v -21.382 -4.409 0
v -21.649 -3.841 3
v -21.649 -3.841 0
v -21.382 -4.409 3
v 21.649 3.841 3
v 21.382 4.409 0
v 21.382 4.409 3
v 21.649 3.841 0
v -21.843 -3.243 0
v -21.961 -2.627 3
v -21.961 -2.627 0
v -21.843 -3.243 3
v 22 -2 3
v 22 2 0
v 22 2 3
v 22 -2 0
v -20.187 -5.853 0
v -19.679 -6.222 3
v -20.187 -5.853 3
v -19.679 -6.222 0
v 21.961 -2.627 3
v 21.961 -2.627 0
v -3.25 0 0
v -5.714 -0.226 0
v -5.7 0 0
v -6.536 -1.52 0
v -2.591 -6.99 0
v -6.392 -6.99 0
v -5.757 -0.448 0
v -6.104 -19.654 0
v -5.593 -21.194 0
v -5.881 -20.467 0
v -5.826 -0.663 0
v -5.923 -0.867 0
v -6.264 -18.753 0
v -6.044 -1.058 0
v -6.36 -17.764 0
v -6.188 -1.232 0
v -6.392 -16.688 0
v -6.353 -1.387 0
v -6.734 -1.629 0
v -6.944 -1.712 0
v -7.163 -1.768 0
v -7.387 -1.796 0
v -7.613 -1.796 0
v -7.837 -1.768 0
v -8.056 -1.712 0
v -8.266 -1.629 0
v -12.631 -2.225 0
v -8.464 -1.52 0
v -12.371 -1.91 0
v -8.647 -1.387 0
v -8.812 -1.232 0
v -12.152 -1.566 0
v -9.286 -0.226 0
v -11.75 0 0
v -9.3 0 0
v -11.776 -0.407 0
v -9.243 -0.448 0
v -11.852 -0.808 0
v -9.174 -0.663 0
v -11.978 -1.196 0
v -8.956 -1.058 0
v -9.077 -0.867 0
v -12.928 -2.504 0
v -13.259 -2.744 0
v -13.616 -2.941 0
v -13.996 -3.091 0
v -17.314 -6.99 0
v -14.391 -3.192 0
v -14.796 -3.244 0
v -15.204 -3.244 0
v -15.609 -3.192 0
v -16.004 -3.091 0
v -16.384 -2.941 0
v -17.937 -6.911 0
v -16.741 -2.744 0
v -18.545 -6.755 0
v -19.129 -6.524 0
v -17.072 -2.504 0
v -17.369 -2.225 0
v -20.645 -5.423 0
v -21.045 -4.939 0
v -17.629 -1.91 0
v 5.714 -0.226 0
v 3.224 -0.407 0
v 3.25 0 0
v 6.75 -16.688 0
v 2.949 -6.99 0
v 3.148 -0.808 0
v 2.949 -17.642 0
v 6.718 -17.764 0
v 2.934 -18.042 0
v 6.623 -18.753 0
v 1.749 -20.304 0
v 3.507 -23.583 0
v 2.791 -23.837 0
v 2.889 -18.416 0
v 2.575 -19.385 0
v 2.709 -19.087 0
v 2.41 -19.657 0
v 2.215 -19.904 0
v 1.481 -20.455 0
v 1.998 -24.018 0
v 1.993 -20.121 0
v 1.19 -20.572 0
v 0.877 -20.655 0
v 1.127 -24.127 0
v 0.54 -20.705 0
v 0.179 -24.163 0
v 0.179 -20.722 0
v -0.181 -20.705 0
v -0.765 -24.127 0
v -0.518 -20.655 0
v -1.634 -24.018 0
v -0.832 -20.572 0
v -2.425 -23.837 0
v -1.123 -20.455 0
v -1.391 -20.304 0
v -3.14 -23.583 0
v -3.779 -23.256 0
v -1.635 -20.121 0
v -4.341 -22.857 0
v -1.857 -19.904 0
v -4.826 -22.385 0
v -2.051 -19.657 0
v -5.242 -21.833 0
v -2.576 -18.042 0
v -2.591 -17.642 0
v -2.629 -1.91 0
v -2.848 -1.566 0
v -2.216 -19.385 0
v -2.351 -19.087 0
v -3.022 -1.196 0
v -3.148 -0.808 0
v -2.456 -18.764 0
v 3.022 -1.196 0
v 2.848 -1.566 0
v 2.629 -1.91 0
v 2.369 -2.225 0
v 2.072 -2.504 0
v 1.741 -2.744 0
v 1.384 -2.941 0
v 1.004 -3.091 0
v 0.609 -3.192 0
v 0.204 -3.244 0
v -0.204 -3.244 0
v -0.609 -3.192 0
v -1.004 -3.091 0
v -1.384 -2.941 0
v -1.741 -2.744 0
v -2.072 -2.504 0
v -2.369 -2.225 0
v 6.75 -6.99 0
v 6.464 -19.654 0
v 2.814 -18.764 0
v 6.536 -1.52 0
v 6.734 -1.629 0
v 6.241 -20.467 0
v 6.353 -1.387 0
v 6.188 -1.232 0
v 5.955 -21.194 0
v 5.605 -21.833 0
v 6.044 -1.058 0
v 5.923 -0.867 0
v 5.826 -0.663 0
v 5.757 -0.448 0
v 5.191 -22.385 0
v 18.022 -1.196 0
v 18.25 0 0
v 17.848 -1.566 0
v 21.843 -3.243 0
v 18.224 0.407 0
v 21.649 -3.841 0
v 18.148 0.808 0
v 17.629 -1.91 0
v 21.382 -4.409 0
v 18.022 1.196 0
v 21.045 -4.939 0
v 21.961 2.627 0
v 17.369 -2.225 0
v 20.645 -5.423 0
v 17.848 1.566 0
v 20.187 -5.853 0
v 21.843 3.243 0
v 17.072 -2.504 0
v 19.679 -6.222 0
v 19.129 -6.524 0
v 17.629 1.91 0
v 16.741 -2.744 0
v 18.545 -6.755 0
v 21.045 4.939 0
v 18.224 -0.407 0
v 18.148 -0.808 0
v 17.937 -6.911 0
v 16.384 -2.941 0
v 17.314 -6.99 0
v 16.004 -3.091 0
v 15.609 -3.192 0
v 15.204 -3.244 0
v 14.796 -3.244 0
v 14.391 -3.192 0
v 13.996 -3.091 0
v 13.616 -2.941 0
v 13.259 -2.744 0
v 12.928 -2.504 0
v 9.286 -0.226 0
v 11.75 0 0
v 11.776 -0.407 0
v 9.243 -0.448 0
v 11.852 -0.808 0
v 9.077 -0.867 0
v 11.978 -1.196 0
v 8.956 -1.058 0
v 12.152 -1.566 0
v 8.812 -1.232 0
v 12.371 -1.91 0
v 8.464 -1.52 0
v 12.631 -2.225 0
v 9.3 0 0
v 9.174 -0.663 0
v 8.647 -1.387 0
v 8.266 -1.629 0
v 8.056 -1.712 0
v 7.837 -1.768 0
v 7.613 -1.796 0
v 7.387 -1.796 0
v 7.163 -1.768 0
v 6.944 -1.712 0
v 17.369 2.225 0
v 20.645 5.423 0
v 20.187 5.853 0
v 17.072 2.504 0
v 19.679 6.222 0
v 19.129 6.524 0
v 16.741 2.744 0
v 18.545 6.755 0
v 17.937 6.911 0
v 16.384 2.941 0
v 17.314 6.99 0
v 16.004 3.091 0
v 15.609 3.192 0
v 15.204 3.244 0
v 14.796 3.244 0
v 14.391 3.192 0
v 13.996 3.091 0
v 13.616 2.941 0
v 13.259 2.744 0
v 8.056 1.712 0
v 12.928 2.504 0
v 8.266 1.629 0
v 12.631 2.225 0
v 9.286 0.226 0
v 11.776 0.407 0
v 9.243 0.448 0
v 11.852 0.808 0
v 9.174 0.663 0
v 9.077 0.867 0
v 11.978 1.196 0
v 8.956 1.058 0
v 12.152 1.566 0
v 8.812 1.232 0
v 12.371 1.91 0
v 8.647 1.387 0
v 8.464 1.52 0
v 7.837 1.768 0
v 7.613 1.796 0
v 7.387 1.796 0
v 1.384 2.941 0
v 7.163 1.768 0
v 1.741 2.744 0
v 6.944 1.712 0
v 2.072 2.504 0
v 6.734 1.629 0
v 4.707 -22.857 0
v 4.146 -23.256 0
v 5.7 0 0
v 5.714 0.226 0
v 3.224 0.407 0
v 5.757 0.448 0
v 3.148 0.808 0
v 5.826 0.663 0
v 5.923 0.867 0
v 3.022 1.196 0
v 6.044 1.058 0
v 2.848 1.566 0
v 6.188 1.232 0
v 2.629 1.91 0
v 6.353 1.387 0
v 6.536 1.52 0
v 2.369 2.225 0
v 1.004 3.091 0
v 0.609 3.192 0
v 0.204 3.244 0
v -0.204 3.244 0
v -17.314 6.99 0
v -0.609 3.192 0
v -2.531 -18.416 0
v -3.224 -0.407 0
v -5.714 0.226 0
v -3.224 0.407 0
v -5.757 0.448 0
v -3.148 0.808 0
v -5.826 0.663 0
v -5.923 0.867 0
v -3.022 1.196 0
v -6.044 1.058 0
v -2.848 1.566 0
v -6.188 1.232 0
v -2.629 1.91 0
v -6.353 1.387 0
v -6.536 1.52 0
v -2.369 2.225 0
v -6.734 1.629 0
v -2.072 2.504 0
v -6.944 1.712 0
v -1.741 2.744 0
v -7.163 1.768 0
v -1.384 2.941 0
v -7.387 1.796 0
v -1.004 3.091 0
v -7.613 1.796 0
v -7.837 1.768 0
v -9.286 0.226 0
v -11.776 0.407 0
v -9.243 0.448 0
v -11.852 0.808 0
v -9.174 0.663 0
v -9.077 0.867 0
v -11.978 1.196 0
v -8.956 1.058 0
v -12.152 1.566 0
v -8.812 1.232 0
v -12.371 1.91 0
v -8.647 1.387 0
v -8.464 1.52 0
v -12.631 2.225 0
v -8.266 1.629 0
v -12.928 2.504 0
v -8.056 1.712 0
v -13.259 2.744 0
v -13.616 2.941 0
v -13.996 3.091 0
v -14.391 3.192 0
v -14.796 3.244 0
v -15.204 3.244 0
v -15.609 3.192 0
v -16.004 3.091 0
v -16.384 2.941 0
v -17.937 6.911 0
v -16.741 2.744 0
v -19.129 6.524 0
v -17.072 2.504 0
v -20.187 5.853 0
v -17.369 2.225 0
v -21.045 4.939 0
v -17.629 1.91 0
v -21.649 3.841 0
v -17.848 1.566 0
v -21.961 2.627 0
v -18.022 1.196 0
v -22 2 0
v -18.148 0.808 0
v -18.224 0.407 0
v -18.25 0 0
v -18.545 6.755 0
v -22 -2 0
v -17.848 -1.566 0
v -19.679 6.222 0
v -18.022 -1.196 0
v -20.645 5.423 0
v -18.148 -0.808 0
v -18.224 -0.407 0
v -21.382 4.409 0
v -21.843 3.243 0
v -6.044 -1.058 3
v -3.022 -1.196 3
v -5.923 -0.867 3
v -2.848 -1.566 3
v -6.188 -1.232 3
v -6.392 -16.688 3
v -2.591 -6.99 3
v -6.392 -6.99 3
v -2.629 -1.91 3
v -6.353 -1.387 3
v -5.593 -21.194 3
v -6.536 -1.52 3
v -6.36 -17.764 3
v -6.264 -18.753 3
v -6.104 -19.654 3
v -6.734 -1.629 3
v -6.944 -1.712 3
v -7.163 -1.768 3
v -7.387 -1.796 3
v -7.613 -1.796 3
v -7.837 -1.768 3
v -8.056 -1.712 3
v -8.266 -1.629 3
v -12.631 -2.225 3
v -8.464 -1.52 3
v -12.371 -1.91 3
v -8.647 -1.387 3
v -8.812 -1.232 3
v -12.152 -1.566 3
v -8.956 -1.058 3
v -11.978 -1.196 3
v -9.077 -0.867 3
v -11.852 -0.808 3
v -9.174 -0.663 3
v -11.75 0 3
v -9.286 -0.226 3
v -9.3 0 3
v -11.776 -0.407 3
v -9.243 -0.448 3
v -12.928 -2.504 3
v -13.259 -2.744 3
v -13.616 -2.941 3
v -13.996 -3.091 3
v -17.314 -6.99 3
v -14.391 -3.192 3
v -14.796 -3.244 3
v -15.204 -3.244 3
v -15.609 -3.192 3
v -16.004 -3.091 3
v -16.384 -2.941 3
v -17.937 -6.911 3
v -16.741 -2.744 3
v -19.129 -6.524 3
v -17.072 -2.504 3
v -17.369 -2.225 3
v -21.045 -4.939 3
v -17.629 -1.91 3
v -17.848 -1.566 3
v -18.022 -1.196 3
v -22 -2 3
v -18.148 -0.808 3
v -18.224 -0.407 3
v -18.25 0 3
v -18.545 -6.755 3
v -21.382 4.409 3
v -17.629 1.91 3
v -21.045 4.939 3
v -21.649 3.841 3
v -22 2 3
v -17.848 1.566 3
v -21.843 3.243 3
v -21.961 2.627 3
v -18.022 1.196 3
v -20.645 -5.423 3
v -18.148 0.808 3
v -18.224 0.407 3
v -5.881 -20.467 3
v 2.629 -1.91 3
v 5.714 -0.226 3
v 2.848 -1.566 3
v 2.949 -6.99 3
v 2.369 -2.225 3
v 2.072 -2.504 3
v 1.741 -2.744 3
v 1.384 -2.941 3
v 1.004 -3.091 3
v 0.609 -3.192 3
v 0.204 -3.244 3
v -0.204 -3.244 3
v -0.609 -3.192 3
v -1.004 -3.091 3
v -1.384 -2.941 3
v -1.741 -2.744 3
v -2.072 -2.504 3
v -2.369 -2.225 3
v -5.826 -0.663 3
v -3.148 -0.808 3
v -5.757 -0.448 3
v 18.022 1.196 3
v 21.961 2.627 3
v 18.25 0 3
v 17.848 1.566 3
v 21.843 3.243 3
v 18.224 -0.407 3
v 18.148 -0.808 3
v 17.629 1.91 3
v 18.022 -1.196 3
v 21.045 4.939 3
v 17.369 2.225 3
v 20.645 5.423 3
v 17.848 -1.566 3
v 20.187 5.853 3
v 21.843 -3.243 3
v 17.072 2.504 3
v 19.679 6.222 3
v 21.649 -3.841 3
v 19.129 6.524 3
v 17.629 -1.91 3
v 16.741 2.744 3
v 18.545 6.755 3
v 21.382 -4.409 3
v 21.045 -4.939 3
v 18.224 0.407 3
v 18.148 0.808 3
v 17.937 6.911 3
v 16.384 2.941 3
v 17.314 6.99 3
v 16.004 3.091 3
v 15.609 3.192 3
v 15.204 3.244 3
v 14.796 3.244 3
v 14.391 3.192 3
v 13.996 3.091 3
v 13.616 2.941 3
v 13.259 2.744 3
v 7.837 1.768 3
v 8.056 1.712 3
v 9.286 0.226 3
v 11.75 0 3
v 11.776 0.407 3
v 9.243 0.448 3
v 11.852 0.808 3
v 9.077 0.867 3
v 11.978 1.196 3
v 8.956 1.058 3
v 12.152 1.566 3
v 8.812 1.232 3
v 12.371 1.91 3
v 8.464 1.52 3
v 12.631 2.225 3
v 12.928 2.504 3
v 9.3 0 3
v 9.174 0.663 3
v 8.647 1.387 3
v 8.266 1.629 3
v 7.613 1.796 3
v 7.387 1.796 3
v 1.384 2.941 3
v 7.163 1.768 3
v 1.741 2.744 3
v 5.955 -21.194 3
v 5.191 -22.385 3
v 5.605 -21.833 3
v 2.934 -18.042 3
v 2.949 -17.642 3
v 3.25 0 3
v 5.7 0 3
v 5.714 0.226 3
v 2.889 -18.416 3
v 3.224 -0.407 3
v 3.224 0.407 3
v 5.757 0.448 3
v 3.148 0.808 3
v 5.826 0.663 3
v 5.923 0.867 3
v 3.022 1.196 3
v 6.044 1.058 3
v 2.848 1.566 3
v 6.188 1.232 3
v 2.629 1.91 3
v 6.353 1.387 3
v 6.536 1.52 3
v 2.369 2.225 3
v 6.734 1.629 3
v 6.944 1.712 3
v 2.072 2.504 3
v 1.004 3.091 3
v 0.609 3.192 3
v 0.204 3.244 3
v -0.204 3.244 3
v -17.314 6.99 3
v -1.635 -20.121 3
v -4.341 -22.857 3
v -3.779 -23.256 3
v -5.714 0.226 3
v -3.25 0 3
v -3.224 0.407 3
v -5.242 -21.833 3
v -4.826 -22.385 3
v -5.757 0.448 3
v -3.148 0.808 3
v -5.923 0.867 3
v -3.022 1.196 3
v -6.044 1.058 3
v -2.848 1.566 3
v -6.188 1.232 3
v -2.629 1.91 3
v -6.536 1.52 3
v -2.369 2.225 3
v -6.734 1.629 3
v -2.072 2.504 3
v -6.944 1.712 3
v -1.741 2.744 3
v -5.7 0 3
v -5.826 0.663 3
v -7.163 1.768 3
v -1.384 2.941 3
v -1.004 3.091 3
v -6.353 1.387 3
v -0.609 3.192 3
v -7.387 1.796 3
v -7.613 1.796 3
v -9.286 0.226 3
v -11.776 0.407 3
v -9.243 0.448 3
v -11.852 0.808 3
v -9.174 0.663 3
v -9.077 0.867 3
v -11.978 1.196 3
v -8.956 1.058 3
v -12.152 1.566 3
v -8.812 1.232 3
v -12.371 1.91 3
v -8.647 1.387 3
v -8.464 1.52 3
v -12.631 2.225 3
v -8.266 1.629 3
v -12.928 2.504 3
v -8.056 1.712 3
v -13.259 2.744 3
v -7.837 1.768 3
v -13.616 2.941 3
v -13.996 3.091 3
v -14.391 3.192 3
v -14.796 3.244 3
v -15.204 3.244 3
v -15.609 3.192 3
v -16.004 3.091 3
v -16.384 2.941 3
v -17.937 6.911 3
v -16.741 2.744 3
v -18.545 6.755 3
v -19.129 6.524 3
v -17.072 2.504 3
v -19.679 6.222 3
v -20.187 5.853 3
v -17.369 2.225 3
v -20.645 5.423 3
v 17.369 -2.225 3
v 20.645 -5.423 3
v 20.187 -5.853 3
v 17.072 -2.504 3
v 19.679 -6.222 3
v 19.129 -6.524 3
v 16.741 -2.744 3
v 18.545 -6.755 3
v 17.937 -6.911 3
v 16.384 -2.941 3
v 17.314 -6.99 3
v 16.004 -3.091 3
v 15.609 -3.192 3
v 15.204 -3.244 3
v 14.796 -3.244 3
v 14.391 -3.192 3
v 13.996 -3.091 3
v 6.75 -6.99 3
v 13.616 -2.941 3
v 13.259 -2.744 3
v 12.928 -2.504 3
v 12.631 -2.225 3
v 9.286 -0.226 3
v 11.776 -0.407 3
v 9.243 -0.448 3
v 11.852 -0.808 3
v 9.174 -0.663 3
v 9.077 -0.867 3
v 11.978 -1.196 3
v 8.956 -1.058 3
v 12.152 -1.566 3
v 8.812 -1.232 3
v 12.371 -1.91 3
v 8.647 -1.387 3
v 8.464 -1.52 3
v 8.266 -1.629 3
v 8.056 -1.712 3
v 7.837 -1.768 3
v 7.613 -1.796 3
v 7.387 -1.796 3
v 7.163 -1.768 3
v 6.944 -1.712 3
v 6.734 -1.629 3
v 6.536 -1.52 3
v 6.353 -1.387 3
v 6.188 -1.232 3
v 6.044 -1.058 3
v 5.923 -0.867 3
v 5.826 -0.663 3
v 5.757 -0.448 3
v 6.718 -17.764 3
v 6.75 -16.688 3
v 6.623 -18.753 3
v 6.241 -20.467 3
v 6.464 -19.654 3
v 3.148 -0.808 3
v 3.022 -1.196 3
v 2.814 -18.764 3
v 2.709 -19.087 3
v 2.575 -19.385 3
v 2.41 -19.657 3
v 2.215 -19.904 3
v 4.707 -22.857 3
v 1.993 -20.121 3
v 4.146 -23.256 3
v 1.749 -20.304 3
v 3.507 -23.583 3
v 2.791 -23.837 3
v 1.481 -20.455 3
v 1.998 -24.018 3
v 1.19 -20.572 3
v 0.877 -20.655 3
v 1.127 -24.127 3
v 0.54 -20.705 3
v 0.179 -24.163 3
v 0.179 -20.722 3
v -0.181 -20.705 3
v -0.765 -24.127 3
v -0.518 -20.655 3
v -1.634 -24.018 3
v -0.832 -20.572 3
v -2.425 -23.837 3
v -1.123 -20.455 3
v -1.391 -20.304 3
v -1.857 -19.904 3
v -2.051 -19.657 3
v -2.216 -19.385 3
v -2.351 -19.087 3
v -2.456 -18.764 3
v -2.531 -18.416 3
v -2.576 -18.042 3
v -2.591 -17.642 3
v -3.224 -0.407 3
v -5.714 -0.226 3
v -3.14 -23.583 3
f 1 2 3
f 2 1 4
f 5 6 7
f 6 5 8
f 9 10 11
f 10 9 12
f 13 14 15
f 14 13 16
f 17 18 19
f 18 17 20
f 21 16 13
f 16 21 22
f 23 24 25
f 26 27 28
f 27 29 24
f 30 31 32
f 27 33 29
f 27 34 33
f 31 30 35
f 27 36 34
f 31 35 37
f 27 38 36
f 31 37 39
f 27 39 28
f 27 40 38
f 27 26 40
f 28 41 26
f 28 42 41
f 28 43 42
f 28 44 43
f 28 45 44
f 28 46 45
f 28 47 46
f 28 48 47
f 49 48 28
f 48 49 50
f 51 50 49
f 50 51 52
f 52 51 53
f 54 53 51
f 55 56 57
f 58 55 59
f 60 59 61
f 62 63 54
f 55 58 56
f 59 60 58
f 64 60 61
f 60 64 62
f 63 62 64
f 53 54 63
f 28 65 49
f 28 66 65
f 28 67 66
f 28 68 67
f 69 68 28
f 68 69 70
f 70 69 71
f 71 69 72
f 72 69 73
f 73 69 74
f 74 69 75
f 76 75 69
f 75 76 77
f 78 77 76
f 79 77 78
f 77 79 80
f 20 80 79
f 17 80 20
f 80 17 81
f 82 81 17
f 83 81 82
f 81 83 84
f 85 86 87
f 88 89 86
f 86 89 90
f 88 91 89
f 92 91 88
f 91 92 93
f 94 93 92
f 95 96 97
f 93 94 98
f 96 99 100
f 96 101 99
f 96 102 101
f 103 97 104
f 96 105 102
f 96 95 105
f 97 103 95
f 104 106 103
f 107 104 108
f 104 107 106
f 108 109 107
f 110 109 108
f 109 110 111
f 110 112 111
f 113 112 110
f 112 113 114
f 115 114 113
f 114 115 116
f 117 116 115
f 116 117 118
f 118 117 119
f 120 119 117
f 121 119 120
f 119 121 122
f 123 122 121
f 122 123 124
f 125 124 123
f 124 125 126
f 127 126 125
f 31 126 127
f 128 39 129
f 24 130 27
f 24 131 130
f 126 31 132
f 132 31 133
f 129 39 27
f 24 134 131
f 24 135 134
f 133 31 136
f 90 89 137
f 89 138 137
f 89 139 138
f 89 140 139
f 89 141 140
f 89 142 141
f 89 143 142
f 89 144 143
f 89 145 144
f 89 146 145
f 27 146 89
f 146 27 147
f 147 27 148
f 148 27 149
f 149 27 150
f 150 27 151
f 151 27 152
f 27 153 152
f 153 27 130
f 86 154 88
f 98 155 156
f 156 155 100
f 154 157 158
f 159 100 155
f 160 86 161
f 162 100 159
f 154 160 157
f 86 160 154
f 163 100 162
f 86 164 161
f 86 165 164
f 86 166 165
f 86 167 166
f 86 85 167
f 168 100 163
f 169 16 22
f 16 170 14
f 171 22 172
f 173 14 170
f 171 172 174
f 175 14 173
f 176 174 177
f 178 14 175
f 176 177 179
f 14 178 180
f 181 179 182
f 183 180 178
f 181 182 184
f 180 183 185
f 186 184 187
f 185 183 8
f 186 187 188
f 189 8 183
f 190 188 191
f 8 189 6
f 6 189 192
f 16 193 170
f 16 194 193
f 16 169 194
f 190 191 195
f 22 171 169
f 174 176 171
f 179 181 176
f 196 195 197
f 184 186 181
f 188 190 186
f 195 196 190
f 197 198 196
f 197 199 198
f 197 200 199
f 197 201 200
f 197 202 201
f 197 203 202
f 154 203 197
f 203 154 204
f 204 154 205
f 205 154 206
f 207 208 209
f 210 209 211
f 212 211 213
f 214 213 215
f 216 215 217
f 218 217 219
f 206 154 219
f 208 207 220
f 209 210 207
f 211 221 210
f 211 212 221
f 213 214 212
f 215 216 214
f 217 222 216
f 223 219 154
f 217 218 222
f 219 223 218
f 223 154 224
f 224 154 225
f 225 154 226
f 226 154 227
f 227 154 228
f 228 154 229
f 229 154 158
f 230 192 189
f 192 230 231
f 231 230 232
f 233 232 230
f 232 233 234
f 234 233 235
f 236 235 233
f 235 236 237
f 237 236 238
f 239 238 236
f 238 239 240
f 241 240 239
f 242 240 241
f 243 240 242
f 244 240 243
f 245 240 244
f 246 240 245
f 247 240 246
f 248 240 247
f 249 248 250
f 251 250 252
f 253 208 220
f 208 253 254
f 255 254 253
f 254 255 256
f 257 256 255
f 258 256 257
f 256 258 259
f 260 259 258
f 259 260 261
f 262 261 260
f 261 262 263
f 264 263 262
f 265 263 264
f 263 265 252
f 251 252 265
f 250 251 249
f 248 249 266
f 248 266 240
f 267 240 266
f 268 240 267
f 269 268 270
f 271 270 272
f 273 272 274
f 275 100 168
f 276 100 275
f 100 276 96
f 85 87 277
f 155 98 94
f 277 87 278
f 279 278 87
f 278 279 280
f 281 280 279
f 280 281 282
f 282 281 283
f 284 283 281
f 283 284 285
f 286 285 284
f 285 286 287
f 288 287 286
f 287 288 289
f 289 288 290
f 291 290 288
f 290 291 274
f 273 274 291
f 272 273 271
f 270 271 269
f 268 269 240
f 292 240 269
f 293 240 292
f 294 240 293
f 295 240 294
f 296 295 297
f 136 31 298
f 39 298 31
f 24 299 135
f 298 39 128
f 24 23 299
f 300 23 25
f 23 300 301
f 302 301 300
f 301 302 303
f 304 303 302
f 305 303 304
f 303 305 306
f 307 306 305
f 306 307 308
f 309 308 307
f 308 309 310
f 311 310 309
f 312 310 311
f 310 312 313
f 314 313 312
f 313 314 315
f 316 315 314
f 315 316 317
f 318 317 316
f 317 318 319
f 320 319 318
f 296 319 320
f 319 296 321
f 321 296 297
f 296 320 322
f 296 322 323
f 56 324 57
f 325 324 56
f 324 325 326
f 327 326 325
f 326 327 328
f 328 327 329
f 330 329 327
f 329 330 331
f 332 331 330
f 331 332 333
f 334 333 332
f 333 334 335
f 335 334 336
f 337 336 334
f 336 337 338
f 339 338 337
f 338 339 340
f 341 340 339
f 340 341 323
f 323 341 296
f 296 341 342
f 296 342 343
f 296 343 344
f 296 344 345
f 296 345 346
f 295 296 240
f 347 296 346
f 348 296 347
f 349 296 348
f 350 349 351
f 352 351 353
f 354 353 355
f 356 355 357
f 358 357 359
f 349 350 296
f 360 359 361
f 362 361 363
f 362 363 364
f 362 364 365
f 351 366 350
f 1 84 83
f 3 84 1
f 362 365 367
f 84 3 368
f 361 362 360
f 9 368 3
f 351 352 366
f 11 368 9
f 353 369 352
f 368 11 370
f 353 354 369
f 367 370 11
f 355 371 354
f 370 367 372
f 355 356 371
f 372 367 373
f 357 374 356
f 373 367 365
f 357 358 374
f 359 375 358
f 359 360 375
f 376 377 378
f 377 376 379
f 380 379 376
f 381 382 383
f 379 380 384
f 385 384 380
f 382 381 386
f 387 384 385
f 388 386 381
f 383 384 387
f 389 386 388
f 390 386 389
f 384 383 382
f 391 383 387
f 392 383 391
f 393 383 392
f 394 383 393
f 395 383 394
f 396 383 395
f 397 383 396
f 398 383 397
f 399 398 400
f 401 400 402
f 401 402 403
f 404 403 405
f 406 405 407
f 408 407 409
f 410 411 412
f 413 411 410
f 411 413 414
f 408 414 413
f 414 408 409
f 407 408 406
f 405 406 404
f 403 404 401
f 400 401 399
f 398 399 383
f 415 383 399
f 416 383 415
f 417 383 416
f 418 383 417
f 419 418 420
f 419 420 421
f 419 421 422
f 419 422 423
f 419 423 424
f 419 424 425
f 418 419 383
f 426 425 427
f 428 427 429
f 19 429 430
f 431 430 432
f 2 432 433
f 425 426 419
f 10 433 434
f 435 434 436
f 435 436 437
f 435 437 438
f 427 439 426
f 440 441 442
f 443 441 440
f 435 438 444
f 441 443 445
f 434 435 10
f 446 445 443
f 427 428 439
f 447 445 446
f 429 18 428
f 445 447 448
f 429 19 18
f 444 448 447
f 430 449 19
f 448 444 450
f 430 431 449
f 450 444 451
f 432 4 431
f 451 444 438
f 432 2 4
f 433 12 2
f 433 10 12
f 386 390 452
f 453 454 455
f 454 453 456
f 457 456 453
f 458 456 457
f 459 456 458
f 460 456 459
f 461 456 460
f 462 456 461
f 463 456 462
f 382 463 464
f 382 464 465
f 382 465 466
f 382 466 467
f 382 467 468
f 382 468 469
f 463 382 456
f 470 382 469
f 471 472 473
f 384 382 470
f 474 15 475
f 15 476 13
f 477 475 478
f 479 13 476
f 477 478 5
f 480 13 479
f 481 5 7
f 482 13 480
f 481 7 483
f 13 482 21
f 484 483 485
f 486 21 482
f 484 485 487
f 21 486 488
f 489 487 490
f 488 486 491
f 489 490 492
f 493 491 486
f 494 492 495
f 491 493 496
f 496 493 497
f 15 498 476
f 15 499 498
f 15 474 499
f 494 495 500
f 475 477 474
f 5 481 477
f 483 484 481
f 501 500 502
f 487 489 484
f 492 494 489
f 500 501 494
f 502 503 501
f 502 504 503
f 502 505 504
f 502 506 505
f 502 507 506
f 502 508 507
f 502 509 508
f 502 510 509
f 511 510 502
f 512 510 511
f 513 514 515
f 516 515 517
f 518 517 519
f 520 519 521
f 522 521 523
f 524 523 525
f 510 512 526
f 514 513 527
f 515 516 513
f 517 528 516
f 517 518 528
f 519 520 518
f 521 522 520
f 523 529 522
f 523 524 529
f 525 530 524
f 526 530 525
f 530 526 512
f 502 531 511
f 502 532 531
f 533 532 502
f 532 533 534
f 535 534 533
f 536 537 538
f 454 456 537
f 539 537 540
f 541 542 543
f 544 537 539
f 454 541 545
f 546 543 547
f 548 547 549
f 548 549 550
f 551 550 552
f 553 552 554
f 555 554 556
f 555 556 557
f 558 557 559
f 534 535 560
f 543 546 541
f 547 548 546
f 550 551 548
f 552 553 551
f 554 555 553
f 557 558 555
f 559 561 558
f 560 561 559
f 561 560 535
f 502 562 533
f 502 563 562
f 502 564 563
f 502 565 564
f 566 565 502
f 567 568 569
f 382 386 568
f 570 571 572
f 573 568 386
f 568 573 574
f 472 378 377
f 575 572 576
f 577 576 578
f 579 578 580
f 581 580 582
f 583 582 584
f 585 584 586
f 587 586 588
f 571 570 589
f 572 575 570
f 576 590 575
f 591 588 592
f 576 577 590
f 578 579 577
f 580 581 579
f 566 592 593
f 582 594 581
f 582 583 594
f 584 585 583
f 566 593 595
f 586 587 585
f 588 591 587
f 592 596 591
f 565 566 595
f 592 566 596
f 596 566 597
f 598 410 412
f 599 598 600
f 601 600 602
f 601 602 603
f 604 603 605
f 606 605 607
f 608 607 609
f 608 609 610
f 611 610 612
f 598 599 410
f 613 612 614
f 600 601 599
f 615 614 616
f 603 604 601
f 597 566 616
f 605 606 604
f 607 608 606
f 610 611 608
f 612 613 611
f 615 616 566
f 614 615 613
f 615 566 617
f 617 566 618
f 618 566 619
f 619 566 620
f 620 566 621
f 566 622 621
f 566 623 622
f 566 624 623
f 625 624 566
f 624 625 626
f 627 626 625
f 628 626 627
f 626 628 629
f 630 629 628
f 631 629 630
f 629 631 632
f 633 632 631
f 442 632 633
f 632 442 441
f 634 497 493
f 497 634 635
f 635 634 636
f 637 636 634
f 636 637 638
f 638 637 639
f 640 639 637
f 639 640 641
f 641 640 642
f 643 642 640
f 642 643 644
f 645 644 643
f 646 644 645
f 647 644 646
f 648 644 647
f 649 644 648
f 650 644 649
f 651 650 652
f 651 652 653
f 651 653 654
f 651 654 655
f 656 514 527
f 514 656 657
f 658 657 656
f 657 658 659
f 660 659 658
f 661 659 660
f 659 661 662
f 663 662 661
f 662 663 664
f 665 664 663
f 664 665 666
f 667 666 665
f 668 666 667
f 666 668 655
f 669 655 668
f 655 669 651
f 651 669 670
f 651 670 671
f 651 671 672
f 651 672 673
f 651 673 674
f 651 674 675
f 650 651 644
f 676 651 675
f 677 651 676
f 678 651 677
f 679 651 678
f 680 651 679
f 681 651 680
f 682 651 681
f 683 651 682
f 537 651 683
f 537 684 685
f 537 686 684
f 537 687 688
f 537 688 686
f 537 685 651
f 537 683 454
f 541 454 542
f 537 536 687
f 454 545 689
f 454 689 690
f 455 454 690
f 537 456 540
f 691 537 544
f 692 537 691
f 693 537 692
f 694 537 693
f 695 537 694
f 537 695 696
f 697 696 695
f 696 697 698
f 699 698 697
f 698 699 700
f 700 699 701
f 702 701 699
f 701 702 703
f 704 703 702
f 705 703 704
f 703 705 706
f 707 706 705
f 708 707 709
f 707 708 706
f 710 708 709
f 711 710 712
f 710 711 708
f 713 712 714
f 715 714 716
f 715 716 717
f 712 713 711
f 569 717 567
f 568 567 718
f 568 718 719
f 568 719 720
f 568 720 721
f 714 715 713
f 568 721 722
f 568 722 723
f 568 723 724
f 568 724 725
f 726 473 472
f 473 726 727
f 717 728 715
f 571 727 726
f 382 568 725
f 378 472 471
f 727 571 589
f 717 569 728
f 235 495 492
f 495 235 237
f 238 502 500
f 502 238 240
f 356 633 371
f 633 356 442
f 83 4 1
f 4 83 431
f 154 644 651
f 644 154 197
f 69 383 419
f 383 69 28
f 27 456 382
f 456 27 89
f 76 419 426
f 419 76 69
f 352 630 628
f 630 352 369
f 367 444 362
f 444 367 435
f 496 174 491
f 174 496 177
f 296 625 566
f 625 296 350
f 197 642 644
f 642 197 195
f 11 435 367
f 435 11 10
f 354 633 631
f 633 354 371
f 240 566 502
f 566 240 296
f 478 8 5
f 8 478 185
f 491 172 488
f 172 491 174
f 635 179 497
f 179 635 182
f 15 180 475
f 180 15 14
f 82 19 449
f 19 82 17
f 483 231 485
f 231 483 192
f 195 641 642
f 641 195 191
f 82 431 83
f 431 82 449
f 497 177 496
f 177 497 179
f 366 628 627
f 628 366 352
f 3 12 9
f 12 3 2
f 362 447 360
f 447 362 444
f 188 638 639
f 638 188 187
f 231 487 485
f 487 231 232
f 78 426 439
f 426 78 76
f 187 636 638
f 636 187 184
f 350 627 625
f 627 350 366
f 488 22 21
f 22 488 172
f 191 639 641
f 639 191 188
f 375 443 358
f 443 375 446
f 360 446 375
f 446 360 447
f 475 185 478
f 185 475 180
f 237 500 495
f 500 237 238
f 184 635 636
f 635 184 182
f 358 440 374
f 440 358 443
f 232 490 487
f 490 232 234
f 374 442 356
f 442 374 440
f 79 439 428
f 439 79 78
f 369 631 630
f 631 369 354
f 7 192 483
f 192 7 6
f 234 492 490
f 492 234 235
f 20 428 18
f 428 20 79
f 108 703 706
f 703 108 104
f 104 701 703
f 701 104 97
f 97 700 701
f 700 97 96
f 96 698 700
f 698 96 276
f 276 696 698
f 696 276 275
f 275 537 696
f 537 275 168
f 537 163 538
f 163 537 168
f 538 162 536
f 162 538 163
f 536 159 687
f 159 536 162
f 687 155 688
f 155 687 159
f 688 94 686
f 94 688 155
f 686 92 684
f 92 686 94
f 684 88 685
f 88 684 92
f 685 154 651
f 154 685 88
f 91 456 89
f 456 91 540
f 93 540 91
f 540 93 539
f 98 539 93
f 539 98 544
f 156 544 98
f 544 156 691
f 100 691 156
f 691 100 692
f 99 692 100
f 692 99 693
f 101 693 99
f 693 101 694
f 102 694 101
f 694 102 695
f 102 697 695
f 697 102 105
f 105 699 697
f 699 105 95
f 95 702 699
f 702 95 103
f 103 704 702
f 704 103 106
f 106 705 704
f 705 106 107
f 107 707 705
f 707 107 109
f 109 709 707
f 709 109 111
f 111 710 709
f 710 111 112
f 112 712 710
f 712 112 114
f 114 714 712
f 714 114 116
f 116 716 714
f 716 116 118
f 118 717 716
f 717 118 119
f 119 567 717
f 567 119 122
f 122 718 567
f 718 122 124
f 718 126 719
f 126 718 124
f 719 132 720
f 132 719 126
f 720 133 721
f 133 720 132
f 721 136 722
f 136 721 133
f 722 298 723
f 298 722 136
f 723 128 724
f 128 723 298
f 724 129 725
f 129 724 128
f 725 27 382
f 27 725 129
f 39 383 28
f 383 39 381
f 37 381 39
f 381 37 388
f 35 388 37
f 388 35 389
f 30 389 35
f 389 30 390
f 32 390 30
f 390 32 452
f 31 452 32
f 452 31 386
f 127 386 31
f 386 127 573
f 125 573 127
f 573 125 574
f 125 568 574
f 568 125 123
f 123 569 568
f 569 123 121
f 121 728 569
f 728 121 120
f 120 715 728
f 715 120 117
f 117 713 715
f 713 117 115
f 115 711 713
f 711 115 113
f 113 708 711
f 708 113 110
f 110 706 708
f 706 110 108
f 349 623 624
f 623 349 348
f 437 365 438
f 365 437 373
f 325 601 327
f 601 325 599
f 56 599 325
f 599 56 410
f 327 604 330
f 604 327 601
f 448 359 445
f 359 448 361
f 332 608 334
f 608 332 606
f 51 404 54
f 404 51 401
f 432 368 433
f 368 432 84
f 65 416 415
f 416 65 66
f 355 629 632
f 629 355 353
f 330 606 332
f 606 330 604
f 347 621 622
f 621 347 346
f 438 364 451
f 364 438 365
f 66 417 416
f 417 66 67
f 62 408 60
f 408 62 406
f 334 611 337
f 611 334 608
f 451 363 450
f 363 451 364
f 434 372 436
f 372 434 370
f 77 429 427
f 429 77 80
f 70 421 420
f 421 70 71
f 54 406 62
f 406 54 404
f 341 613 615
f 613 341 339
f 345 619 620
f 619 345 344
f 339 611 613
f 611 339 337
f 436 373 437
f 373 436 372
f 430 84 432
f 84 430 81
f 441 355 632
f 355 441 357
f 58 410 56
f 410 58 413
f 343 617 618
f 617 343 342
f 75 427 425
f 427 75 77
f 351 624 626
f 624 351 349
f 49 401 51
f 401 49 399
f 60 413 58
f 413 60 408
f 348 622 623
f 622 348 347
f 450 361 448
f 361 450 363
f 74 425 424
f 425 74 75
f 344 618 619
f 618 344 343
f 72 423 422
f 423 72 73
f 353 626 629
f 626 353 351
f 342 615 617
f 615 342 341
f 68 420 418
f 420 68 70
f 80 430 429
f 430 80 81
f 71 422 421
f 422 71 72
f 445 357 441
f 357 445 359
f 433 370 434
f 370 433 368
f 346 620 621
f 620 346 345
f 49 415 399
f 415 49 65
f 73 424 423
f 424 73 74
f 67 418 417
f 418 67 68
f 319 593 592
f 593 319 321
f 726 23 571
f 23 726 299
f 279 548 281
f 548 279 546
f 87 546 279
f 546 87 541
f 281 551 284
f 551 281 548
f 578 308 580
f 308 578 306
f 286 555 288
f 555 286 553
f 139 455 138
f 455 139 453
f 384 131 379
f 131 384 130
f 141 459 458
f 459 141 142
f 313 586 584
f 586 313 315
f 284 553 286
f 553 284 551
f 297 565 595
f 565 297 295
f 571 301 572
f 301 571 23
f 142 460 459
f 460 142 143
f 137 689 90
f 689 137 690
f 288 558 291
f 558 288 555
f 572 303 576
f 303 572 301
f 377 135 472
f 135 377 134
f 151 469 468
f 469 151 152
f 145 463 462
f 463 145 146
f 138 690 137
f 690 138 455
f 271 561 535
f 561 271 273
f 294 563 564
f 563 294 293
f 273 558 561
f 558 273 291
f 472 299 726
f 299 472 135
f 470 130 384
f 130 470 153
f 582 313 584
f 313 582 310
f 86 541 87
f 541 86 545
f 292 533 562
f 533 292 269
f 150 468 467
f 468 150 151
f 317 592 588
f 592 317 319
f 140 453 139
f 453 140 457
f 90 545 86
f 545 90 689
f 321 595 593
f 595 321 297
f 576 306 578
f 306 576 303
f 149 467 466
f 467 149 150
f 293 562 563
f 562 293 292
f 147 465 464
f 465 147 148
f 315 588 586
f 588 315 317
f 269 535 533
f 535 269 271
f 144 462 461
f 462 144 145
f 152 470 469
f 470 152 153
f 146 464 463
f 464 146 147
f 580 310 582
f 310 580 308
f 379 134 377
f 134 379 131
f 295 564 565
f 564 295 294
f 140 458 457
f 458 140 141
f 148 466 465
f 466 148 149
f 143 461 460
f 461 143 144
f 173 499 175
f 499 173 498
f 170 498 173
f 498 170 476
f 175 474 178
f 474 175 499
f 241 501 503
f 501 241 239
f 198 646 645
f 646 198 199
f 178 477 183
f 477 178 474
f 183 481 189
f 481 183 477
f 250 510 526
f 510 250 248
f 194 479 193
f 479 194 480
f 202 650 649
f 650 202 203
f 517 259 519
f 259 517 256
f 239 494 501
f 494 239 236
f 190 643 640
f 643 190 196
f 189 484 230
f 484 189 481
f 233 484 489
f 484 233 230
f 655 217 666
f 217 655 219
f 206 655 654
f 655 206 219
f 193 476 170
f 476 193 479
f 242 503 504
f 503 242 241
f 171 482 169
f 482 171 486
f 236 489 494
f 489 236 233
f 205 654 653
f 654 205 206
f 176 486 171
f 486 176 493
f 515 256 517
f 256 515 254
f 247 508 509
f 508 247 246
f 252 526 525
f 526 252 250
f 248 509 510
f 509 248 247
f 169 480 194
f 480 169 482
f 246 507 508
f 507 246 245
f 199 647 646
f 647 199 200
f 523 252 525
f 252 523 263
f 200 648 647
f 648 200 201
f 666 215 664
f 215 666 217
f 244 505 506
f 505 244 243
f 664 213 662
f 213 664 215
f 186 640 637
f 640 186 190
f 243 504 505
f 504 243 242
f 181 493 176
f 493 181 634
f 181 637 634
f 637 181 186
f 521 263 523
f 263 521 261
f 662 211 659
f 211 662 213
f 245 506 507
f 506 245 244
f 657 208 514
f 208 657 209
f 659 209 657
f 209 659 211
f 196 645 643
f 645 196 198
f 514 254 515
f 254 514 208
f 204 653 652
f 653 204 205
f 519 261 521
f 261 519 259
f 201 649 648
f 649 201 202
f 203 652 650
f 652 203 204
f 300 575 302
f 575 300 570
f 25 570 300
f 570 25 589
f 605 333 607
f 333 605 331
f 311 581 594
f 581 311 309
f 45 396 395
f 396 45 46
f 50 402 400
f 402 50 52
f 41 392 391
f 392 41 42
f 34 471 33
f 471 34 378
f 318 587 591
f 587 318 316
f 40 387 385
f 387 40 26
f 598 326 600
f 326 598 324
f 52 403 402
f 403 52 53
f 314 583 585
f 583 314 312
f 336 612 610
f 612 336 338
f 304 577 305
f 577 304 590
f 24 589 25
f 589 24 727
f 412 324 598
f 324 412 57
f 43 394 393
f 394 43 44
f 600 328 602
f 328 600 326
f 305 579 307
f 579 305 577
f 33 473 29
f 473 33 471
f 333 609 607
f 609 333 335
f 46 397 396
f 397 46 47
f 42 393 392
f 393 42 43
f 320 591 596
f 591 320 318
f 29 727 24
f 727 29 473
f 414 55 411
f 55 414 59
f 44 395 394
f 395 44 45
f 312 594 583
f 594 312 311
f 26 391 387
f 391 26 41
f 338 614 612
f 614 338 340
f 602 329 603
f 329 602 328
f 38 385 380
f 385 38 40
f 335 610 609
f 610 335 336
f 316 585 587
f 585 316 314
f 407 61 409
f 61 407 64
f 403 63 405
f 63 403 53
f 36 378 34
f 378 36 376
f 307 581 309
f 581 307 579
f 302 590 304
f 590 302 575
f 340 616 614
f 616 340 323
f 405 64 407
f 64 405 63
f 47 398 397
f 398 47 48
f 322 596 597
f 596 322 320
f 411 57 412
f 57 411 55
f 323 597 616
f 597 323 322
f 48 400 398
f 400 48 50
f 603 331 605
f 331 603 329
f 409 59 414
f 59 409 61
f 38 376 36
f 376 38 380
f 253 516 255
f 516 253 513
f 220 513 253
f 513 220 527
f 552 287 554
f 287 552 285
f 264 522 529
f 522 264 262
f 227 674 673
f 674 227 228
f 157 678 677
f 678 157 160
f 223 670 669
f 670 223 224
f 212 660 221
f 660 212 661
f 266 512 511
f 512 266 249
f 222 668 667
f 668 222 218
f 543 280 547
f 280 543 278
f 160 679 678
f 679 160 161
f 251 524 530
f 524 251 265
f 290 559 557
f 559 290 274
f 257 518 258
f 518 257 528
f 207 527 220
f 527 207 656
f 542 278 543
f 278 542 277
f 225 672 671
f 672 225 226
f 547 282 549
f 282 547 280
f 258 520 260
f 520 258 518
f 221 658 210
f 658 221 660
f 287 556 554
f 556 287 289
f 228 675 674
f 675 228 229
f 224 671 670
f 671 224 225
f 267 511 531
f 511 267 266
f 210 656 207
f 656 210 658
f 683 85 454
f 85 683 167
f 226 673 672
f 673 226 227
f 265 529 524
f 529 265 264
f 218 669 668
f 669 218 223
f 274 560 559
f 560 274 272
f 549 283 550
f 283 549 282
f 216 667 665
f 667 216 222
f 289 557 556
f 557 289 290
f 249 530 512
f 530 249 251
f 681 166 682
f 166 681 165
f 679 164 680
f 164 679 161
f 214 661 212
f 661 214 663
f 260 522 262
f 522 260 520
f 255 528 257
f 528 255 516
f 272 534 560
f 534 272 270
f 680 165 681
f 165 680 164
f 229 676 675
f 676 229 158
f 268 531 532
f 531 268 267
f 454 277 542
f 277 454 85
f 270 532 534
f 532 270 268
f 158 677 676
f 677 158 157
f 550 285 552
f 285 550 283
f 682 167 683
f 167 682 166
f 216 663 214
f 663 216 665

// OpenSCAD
$fn = 50;


difference() {
	union() {
		hull() {
			translate(v = [-17.0000000000, 2.0000000000, 0]) {
				cylinder(h = 3, r = 5);
			}
			translate(v = [17.0000000000, 2.0000000000, 0]) {
				cylinder(h = 3, r = 5);
			}
			translate(v = [-17.0000000000, -2.0000000000, 0]) {
				cylinder(h = 3, r = 5);
			}
			translate(v = [17.0000000000, -2.0000000000, 0]) {
				cylinder(h = 3, r = 5);
			}
		}
		translate(v = [0, -5, 0]) {
			linear_extrude(height = 3) {
				text(font = "DejaVu Sans Mono:style=Bold", halign = "center", size = 19.0000000000, text = "U", valign = "top");
			}
		}
	}
	union() {
		translate(v = [-15.0000000000, 0.0000000000, 0]) {
			translate(v = [0, 0, -100]) {
				cylinder(h = 200, r = 3.2500000000);
			}
		}
		translate(v = [0, 0, -100]) {
			cylinder(h = 200, r = 3.2500000000);
		}
		translate(v = [15.0000000000, 0.0000000000, 0]) {
			translate(v = [0, 0, -100]) {
				cylinder(h = 200, r = 3.2500000000);
			}
		}
		translate(v = [-15.0000000000, 0.0000000000, 0]) {
			translate(v = [0, 0, -100]) {
				cylinder(h = 200, r = 1.8000000000);
			}
		}
		translate(v = [-7.5000000000, 0.0000000000, 0]) {
			translate(v = [0, 0, -100]) {
				cylinder(h = 200, r = 1.8000000000);
			}
		}
		translate(v = [0, 0, -100]) {
			cylinder(h = 200, r = 1.8000000000);
		}
		translate(v = [7.5000000000, 0.0000000000, 0]) {
			translate(v = [0, 0, -100]) {
				cylinder(h = 200, r = 1.8000000000);
			}
		}
		translate(v = [15.0000000000, 0.0000000000, 0]) {
			translate(v = [0, 0, -100]) {
				cylinder(h = 200, r = 1.8000000000);
			}
		}
	}
}
